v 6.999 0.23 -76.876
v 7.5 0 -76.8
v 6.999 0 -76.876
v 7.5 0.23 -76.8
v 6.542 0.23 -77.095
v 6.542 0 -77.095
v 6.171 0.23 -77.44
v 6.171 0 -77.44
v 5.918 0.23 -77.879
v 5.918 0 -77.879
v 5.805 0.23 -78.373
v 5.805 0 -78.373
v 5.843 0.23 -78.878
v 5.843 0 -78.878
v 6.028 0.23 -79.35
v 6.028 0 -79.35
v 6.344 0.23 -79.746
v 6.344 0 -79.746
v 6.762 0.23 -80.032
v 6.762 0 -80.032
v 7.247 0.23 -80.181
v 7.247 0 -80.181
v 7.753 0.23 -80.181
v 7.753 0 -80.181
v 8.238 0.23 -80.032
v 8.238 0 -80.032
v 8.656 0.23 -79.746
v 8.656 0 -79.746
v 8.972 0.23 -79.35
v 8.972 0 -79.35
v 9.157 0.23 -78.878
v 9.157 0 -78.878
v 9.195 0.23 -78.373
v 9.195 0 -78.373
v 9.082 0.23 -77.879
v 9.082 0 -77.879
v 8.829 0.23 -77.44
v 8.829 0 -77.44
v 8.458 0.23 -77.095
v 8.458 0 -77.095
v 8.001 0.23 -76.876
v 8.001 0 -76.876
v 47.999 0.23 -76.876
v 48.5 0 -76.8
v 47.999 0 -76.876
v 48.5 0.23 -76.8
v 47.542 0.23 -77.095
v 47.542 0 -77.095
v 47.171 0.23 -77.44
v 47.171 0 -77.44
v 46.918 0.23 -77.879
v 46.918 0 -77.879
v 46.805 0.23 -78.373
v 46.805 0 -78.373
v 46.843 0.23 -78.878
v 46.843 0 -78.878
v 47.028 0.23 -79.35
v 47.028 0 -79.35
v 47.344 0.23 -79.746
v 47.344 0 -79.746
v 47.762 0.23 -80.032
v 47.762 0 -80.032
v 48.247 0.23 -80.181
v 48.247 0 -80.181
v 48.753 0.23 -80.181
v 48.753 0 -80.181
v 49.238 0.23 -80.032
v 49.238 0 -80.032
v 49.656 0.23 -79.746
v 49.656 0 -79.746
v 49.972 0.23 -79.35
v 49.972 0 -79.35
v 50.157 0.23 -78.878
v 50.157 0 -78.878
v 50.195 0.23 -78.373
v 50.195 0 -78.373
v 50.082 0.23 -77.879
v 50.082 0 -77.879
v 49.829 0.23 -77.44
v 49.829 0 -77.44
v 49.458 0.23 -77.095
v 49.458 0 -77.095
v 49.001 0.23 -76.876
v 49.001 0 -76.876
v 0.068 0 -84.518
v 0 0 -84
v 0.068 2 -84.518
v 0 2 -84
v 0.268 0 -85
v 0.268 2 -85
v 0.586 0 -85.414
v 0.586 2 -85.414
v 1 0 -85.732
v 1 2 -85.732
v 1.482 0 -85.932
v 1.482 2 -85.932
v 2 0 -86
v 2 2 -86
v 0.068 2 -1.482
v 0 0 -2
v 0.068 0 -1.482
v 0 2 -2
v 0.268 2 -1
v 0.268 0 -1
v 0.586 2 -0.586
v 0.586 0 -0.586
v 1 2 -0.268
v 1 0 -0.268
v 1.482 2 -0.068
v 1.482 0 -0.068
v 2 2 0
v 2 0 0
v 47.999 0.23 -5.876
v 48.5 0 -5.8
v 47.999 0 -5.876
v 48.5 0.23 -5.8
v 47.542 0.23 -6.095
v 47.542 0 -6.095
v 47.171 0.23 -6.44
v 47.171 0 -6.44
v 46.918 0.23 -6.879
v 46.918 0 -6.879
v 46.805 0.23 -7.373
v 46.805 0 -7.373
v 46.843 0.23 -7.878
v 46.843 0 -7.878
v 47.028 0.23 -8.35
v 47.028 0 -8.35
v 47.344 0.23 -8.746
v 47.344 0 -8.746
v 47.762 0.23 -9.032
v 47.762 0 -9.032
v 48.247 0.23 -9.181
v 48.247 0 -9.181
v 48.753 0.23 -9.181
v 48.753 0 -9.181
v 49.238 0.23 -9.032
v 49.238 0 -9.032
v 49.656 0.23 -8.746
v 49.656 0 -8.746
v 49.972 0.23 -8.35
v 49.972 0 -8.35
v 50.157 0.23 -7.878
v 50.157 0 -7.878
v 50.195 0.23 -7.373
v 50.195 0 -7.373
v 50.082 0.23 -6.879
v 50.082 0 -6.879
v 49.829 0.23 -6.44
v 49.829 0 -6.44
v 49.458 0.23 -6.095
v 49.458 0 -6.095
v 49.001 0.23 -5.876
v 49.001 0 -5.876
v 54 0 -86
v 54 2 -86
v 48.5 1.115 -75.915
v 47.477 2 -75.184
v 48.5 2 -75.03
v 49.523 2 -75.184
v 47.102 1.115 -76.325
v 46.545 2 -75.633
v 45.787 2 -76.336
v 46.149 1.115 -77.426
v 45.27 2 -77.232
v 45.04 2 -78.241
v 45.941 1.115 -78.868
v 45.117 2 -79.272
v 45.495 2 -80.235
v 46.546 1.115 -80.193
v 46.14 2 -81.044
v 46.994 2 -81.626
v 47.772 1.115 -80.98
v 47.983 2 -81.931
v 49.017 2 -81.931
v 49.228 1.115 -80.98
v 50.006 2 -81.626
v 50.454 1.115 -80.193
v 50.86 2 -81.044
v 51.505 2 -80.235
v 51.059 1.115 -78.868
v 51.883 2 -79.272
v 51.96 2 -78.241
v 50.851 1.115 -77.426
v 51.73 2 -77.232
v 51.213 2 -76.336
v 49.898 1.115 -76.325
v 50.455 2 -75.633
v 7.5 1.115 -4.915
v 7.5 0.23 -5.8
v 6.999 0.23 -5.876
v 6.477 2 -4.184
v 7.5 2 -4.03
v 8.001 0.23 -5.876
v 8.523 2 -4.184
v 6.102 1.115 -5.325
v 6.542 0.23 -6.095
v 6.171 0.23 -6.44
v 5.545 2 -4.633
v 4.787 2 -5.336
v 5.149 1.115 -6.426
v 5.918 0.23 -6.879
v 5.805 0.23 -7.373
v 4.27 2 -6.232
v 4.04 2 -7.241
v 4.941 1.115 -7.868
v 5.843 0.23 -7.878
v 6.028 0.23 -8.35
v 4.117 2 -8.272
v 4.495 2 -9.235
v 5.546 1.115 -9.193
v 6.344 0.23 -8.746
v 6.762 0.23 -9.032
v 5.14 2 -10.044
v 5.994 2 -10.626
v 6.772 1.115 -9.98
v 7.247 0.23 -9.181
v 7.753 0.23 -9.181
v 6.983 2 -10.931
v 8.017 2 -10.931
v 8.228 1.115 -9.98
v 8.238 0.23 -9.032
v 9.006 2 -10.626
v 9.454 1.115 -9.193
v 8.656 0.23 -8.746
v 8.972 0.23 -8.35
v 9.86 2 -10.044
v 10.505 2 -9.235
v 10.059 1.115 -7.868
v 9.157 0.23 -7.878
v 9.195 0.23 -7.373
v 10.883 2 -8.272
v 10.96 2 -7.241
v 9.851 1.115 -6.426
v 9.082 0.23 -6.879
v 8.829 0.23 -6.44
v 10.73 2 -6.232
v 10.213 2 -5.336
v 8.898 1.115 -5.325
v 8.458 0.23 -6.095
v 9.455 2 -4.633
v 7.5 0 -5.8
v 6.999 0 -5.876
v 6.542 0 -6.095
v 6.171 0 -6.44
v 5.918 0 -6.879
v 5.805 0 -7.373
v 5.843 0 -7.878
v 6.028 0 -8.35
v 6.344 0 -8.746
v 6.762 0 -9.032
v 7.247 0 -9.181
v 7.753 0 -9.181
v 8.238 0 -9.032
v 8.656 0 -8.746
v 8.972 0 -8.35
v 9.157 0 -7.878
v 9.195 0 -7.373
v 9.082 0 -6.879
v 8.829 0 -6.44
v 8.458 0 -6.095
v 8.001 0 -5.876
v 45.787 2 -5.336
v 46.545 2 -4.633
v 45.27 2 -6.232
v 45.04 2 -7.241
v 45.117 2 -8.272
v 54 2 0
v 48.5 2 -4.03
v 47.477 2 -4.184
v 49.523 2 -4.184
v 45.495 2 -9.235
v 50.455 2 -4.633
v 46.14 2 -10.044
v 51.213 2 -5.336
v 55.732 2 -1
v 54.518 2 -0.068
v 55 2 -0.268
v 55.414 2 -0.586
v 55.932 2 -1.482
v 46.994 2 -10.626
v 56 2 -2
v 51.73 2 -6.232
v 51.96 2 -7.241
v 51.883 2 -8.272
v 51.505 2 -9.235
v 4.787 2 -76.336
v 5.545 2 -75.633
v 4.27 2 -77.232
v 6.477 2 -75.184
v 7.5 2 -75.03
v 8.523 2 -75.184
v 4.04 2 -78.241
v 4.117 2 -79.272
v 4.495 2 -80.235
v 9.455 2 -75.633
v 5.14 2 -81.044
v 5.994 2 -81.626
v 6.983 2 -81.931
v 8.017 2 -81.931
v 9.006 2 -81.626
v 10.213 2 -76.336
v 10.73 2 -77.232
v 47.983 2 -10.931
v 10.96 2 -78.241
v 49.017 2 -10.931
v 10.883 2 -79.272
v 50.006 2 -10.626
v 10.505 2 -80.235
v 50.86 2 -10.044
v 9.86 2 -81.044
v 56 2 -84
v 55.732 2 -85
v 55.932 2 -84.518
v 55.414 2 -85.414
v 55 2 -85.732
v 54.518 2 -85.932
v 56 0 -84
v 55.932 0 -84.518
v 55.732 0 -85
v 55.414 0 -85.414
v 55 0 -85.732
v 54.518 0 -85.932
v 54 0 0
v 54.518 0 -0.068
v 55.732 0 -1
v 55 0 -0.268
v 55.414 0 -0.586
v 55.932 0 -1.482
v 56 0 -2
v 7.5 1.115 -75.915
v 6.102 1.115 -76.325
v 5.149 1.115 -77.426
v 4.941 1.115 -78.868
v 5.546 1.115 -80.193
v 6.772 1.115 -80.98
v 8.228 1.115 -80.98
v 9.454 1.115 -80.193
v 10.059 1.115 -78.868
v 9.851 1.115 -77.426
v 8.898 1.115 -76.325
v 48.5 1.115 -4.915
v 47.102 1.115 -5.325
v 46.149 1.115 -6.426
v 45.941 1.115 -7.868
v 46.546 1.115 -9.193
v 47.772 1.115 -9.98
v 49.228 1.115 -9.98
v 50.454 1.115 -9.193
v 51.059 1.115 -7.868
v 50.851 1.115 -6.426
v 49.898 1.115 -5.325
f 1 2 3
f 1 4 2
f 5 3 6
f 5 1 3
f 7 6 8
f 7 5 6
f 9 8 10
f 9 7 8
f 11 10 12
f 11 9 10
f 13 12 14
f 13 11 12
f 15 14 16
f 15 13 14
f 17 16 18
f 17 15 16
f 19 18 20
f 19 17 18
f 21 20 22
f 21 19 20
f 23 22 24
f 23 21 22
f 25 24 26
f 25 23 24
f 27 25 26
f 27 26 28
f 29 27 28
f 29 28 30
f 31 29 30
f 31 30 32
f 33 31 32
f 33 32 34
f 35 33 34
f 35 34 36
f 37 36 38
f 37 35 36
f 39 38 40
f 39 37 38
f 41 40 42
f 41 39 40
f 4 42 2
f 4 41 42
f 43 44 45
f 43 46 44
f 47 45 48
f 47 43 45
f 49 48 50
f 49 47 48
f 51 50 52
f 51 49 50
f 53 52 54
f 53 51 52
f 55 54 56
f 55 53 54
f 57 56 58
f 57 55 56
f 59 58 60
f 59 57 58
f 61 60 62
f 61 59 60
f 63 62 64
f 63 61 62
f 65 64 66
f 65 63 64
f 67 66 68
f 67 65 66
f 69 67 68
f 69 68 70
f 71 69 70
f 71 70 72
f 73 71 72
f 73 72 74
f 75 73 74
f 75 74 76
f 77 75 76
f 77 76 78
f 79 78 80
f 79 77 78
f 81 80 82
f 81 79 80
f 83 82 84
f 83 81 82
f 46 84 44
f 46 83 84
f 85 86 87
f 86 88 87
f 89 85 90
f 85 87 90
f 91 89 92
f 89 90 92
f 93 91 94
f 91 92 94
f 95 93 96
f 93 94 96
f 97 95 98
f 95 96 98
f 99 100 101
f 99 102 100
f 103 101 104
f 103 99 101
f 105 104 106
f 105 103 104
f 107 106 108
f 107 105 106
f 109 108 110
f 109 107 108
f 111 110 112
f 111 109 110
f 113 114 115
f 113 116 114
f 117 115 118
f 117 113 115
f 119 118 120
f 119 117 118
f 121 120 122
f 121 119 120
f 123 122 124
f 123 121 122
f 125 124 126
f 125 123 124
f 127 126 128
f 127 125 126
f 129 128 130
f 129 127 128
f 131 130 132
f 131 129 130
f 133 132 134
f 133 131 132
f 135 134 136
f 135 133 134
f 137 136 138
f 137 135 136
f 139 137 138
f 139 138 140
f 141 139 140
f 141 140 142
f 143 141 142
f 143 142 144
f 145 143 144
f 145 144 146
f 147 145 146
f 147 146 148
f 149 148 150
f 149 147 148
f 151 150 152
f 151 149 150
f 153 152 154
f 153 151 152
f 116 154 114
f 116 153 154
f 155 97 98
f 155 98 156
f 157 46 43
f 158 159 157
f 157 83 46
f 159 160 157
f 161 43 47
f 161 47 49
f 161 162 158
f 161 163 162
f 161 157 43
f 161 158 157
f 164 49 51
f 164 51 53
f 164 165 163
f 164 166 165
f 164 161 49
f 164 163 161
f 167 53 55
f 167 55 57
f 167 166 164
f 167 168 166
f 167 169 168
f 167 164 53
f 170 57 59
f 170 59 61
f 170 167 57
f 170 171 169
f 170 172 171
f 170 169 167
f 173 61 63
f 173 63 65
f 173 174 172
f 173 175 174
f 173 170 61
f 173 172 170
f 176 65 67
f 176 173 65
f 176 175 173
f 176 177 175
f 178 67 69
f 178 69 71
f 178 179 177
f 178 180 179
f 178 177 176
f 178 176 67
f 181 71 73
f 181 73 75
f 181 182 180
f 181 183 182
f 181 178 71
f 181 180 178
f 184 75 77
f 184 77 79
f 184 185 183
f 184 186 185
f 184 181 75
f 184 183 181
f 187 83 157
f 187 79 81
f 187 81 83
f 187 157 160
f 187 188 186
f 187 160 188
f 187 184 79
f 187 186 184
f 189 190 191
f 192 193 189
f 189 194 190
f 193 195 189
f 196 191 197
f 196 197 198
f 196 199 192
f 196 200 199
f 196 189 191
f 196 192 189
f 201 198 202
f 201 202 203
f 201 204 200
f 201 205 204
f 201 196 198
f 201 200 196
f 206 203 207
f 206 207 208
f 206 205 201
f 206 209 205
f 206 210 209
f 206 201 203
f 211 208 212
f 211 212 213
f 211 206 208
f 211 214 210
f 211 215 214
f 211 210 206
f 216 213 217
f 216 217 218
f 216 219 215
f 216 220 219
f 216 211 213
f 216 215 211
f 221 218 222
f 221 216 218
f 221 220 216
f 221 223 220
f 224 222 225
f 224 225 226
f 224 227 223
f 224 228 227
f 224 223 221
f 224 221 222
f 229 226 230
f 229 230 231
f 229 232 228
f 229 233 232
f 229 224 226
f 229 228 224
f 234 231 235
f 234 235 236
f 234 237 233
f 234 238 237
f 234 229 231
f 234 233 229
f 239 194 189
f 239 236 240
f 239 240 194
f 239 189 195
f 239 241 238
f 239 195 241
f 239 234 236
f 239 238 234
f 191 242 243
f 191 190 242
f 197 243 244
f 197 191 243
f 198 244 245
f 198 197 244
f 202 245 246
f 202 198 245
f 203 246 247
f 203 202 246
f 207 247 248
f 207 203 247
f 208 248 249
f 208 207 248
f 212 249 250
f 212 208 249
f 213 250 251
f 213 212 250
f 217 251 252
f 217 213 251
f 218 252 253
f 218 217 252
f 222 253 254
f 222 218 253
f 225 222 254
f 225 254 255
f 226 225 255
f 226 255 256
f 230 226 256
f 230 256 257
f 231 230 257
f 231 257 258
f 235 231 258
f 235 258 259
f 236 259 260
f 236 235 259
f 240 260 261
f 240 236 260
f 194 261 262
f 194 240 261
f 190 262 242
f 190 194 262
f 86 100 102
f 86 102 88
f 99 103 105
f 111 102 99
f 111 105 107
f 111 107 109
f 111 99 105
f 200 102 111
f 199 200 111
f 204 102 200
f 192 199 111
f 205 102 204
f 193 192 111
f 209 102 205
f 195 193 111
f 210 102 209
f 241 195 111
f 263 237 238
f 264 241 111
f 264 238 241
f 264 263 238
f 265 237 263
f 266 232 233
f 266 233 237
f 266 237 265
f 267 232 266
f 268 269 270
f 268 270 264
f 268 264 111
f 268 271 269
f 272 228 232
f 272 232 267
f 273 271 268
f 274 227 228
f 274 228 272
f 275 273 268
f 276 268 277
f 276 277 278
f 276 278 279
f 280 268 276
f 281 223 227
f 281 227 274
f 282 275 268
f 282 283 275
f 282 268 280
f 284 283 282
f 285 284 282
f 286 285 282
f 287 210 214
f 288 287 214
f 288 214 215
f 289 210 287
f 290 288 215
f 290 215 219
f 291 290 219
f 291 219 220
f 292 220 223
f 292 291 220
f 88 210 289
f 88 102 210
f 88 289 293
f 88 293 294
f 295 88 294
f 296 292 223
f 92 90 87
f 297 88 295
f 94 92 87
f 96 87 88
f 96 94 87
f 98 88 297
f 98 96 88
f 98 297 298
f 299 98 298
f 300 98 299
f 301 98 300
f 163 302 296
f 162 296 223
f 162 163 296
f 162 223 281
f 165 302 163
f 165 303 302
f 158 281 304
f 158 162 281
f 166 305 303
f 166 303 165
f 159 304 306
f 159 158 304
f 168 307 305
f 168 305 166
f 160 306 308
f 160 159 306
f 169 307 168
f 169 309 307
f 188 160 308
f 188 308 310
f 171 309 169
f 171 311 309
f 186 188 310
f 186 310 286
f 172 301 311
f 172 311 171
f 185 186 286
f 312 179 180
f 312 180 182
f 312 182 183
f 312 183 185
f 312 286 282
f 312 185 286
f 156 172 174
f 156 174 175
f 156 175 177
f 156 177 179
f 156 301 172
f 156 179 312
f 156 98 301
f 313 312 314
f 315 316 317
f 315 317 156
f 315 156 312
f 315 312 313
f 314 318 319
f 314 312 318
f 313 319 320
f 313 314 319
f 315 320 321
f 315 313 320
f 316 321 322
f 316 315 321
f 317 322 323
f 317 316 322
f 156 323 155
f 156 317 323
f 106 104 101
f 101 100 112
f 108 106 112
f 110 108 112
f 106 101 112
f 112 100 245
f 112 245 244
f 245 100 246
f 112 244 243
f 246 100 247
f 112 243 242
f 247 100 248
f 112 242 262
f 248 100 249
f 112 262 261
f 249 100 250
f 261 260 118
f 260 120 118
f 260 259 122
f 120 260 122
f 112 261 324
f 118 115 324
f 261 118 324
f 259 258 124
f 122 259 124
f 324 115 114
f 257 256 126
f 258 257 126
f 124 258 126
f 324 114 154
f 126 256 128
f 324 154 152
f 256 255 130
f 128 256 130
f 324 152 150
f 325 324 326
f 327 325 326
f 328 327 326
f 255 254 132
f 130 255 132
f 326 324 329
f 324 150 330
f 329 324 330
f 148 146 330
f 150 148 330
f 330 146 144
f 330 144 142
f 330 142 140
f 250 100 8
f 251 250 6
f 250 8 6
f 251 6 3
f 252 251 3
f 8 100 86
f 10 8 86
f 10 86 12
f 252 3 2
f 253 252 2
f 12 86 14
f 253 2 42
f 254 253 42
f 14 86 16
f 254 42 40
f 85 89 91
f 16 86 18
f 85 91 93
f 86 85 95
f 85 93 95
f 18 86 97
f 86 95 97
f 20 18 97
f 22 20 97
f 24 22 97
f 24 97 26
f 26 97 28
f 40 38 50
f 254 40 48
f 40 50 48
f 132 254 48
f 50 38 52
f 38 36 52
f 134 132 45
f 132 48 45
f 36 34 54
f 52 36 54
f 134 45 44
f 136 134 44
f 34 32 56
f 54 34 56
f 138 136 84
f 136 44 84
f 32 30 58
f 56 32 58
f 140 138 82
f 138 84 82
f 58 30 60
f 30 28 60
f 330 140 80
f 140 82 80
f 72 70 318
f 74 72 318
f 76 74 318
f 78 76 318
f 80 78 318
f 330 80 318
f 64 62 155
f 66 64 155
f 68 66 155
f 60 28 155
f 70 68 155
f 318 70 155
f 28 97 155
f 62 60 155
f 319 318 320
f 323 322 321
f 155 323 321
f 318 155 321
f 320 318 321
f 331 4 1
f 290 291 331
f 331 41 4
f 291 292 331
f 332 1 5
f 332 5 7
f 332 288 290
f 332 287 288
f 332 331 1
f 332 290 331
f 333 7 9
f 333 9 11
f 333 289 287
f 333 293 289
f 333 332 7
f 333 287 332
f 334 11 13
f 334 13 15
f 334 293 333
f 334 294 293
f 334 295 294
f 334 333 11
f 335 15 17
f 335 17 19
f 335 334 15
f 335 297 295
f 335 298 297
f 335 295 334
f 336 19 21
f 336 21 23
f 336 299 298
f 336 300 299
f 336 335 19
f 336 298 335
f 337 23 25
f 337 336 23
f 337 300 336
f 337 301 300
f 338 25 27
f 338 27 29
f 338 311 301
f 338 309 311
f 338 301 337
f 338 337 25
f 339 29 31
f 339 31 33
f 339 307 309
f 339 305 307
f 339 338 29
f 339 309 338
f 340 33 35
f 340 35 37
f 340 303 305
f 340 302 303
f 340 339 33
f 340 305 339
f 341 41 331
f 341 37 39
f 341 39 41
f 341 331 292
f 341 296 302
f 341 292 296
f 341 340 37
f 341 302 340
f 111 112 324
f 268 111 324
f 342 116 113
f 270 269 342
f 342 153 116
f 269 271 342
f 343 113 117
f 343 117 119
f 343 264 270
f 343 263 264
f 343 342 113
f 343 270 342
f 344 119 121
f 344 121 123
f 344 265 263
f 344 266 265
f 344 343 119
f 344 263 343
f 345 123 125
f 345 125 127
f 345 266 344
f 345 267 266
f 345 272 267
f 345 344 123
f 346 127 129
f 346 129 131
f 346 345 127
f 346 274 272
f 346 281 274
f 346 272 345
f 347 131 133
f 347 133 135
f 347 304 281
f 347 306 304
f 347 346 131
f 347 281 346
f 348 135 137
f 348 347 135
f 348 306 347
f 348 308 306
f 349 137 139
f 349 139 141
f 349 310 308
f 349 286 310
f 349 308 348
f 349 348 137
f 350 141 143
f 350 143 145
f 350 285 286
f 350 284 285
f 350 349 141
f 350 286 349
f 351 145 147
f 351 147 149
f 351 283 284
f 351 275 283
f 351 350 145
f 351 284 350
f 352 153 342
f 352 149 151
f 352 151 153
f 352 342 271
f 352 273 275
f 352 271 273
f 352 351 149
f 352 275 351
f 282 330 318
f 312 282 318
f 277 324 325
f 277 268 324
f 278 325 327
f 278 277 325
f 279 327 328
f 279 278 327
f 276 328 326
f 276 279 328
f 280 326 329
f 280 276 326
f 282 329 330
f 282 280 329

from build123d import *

# Parameters (mm, degrees)
SKIZZE1_W                                   = 56
SKIZZE1_H                                   = 86
AUFSATZ_LINEAR_AUSTRAGEN1_DEPTH             = 2
VERRUNDUNG1_R                               = 2
FORMSENKUNG_F_R_M3_SENKSCHRAUBE_MIT_2_COUNT = 2
FORMSENKUNG_F_R_M3_SENKSCHRAUBE_MIT_2_PITCH = 81.987803971
FORMSENKUNG_F_R_M3_SENKSCHRAUBE_MIT_3_COUNT = 2
FORMSENKUNG_F_R_M3_SENKSCHRAUBE_MIT_3_PITCH = 71
FORMSENKUNG_F_R_M3_SENKSCHRAUBE_MIT_4_COUNT = 2
FORMSENKUNG_F_R_M3_SENKSCHRAUBE_MIT_4_PITCH = 41


with BuildPart() as part:
    # Skizze1 → Aufsatz-Linear austragen1 (new body)
    with BuildSketch(Plane(origin=(0, 0, 0), x_dir=(1, 0, 0), z_dir=(0, 1, 0))):
        with Locations((28, 43)):
            Rectangle(SKIZZE1_W, SKIZZE1_H)
    extrude(amount=AUFSATZ_LINEAR_AUSTRAGEN1_DEPTH)

    # Verrundung1
    verrundung1_edges = [part.edges().sort_by_distance(p)[0] for p in [
        (0, 1, -86),
        (56, 1, -86),
        (56, 1, 0),
        (0, 1, 0),
    ]]
    fillet(verrundung1_edges, radius=VERRUNDUNG1_R)

    # Skizze3 → Formsenkung für M3 Senkschraube mit Innensechskant1 (revolve, cut)
    with BuildSketch(Plane(origin=(7.5, 2, -7.5), x_dir=(0, 0, 1), z_dir=(1, 0, 0))):
        Polygon((0, 0), (0, 2), (1.7, 2), (1.7, 1.77), (3.47, 0), align=None)
    formsenkung_f_r_m3_senkschraube_mit_inne = revolve(axis=Axis((7.5, 8.35, -7.5), (0, -1, 0)), mode=Mode.SUBTRACT)

    # Formsenkung f_r M3 Senkschraube mit  2: Formsenkung für M3 Senkschraube mit Innensechskant1 ×2
    with Locations(*[Vector(0.5000743770922673, 0, -0.865982457891487) * (i * FORMSENKUNG_F_R_M3_SENKSCHRAUBE_MIT_2_PITCH) for i in range(1, FORMSENKUNG_F_R_M3_SENKSCHRAUBE_MIT_2_COUNT)]):
        add(formsenkung_f_r_m3_senkschraube_mit_inne, mode=Mode.SUBTRACT)

    # Formsenkung f_r M3 Senkschraube mit  3: Formsenkung für M3 Senkschraube mit Innensechskant1 ×2
    with Locations(*[(0, 0, -i * FORMSENKUNG_F_R_M3_SENKSCHRAUBE_MIT_3_PITCH) for i in range(1, FORMSENKUNG_F_R_M3_SENKSCHRAUBE_MIT_3_COUNT)]):
        add(formsenkung_f_r_m3_senkschraube_mit_inne, mode=Mode.SUBTRACT)

    # Formsenkung f_r M3 Senkschraube mit  4: Formsenkung für M3 Senkschraube mit Innensechskant1 ×2
    with Locations(*[(i * FORMSENKUNG_F_R_M3_SENKSCHRAUBE_MIT_4_PITCH, 0, 0) for i in range(1, FORMSENKUNG_F_R_M3_SENKSCHRAUBE_MIT_4_COUNT)]):
        add(formsenkung_f_r_m3_senkschraube_mit_inne, mode=Mode.SUBTRACT)


solid = part.part
